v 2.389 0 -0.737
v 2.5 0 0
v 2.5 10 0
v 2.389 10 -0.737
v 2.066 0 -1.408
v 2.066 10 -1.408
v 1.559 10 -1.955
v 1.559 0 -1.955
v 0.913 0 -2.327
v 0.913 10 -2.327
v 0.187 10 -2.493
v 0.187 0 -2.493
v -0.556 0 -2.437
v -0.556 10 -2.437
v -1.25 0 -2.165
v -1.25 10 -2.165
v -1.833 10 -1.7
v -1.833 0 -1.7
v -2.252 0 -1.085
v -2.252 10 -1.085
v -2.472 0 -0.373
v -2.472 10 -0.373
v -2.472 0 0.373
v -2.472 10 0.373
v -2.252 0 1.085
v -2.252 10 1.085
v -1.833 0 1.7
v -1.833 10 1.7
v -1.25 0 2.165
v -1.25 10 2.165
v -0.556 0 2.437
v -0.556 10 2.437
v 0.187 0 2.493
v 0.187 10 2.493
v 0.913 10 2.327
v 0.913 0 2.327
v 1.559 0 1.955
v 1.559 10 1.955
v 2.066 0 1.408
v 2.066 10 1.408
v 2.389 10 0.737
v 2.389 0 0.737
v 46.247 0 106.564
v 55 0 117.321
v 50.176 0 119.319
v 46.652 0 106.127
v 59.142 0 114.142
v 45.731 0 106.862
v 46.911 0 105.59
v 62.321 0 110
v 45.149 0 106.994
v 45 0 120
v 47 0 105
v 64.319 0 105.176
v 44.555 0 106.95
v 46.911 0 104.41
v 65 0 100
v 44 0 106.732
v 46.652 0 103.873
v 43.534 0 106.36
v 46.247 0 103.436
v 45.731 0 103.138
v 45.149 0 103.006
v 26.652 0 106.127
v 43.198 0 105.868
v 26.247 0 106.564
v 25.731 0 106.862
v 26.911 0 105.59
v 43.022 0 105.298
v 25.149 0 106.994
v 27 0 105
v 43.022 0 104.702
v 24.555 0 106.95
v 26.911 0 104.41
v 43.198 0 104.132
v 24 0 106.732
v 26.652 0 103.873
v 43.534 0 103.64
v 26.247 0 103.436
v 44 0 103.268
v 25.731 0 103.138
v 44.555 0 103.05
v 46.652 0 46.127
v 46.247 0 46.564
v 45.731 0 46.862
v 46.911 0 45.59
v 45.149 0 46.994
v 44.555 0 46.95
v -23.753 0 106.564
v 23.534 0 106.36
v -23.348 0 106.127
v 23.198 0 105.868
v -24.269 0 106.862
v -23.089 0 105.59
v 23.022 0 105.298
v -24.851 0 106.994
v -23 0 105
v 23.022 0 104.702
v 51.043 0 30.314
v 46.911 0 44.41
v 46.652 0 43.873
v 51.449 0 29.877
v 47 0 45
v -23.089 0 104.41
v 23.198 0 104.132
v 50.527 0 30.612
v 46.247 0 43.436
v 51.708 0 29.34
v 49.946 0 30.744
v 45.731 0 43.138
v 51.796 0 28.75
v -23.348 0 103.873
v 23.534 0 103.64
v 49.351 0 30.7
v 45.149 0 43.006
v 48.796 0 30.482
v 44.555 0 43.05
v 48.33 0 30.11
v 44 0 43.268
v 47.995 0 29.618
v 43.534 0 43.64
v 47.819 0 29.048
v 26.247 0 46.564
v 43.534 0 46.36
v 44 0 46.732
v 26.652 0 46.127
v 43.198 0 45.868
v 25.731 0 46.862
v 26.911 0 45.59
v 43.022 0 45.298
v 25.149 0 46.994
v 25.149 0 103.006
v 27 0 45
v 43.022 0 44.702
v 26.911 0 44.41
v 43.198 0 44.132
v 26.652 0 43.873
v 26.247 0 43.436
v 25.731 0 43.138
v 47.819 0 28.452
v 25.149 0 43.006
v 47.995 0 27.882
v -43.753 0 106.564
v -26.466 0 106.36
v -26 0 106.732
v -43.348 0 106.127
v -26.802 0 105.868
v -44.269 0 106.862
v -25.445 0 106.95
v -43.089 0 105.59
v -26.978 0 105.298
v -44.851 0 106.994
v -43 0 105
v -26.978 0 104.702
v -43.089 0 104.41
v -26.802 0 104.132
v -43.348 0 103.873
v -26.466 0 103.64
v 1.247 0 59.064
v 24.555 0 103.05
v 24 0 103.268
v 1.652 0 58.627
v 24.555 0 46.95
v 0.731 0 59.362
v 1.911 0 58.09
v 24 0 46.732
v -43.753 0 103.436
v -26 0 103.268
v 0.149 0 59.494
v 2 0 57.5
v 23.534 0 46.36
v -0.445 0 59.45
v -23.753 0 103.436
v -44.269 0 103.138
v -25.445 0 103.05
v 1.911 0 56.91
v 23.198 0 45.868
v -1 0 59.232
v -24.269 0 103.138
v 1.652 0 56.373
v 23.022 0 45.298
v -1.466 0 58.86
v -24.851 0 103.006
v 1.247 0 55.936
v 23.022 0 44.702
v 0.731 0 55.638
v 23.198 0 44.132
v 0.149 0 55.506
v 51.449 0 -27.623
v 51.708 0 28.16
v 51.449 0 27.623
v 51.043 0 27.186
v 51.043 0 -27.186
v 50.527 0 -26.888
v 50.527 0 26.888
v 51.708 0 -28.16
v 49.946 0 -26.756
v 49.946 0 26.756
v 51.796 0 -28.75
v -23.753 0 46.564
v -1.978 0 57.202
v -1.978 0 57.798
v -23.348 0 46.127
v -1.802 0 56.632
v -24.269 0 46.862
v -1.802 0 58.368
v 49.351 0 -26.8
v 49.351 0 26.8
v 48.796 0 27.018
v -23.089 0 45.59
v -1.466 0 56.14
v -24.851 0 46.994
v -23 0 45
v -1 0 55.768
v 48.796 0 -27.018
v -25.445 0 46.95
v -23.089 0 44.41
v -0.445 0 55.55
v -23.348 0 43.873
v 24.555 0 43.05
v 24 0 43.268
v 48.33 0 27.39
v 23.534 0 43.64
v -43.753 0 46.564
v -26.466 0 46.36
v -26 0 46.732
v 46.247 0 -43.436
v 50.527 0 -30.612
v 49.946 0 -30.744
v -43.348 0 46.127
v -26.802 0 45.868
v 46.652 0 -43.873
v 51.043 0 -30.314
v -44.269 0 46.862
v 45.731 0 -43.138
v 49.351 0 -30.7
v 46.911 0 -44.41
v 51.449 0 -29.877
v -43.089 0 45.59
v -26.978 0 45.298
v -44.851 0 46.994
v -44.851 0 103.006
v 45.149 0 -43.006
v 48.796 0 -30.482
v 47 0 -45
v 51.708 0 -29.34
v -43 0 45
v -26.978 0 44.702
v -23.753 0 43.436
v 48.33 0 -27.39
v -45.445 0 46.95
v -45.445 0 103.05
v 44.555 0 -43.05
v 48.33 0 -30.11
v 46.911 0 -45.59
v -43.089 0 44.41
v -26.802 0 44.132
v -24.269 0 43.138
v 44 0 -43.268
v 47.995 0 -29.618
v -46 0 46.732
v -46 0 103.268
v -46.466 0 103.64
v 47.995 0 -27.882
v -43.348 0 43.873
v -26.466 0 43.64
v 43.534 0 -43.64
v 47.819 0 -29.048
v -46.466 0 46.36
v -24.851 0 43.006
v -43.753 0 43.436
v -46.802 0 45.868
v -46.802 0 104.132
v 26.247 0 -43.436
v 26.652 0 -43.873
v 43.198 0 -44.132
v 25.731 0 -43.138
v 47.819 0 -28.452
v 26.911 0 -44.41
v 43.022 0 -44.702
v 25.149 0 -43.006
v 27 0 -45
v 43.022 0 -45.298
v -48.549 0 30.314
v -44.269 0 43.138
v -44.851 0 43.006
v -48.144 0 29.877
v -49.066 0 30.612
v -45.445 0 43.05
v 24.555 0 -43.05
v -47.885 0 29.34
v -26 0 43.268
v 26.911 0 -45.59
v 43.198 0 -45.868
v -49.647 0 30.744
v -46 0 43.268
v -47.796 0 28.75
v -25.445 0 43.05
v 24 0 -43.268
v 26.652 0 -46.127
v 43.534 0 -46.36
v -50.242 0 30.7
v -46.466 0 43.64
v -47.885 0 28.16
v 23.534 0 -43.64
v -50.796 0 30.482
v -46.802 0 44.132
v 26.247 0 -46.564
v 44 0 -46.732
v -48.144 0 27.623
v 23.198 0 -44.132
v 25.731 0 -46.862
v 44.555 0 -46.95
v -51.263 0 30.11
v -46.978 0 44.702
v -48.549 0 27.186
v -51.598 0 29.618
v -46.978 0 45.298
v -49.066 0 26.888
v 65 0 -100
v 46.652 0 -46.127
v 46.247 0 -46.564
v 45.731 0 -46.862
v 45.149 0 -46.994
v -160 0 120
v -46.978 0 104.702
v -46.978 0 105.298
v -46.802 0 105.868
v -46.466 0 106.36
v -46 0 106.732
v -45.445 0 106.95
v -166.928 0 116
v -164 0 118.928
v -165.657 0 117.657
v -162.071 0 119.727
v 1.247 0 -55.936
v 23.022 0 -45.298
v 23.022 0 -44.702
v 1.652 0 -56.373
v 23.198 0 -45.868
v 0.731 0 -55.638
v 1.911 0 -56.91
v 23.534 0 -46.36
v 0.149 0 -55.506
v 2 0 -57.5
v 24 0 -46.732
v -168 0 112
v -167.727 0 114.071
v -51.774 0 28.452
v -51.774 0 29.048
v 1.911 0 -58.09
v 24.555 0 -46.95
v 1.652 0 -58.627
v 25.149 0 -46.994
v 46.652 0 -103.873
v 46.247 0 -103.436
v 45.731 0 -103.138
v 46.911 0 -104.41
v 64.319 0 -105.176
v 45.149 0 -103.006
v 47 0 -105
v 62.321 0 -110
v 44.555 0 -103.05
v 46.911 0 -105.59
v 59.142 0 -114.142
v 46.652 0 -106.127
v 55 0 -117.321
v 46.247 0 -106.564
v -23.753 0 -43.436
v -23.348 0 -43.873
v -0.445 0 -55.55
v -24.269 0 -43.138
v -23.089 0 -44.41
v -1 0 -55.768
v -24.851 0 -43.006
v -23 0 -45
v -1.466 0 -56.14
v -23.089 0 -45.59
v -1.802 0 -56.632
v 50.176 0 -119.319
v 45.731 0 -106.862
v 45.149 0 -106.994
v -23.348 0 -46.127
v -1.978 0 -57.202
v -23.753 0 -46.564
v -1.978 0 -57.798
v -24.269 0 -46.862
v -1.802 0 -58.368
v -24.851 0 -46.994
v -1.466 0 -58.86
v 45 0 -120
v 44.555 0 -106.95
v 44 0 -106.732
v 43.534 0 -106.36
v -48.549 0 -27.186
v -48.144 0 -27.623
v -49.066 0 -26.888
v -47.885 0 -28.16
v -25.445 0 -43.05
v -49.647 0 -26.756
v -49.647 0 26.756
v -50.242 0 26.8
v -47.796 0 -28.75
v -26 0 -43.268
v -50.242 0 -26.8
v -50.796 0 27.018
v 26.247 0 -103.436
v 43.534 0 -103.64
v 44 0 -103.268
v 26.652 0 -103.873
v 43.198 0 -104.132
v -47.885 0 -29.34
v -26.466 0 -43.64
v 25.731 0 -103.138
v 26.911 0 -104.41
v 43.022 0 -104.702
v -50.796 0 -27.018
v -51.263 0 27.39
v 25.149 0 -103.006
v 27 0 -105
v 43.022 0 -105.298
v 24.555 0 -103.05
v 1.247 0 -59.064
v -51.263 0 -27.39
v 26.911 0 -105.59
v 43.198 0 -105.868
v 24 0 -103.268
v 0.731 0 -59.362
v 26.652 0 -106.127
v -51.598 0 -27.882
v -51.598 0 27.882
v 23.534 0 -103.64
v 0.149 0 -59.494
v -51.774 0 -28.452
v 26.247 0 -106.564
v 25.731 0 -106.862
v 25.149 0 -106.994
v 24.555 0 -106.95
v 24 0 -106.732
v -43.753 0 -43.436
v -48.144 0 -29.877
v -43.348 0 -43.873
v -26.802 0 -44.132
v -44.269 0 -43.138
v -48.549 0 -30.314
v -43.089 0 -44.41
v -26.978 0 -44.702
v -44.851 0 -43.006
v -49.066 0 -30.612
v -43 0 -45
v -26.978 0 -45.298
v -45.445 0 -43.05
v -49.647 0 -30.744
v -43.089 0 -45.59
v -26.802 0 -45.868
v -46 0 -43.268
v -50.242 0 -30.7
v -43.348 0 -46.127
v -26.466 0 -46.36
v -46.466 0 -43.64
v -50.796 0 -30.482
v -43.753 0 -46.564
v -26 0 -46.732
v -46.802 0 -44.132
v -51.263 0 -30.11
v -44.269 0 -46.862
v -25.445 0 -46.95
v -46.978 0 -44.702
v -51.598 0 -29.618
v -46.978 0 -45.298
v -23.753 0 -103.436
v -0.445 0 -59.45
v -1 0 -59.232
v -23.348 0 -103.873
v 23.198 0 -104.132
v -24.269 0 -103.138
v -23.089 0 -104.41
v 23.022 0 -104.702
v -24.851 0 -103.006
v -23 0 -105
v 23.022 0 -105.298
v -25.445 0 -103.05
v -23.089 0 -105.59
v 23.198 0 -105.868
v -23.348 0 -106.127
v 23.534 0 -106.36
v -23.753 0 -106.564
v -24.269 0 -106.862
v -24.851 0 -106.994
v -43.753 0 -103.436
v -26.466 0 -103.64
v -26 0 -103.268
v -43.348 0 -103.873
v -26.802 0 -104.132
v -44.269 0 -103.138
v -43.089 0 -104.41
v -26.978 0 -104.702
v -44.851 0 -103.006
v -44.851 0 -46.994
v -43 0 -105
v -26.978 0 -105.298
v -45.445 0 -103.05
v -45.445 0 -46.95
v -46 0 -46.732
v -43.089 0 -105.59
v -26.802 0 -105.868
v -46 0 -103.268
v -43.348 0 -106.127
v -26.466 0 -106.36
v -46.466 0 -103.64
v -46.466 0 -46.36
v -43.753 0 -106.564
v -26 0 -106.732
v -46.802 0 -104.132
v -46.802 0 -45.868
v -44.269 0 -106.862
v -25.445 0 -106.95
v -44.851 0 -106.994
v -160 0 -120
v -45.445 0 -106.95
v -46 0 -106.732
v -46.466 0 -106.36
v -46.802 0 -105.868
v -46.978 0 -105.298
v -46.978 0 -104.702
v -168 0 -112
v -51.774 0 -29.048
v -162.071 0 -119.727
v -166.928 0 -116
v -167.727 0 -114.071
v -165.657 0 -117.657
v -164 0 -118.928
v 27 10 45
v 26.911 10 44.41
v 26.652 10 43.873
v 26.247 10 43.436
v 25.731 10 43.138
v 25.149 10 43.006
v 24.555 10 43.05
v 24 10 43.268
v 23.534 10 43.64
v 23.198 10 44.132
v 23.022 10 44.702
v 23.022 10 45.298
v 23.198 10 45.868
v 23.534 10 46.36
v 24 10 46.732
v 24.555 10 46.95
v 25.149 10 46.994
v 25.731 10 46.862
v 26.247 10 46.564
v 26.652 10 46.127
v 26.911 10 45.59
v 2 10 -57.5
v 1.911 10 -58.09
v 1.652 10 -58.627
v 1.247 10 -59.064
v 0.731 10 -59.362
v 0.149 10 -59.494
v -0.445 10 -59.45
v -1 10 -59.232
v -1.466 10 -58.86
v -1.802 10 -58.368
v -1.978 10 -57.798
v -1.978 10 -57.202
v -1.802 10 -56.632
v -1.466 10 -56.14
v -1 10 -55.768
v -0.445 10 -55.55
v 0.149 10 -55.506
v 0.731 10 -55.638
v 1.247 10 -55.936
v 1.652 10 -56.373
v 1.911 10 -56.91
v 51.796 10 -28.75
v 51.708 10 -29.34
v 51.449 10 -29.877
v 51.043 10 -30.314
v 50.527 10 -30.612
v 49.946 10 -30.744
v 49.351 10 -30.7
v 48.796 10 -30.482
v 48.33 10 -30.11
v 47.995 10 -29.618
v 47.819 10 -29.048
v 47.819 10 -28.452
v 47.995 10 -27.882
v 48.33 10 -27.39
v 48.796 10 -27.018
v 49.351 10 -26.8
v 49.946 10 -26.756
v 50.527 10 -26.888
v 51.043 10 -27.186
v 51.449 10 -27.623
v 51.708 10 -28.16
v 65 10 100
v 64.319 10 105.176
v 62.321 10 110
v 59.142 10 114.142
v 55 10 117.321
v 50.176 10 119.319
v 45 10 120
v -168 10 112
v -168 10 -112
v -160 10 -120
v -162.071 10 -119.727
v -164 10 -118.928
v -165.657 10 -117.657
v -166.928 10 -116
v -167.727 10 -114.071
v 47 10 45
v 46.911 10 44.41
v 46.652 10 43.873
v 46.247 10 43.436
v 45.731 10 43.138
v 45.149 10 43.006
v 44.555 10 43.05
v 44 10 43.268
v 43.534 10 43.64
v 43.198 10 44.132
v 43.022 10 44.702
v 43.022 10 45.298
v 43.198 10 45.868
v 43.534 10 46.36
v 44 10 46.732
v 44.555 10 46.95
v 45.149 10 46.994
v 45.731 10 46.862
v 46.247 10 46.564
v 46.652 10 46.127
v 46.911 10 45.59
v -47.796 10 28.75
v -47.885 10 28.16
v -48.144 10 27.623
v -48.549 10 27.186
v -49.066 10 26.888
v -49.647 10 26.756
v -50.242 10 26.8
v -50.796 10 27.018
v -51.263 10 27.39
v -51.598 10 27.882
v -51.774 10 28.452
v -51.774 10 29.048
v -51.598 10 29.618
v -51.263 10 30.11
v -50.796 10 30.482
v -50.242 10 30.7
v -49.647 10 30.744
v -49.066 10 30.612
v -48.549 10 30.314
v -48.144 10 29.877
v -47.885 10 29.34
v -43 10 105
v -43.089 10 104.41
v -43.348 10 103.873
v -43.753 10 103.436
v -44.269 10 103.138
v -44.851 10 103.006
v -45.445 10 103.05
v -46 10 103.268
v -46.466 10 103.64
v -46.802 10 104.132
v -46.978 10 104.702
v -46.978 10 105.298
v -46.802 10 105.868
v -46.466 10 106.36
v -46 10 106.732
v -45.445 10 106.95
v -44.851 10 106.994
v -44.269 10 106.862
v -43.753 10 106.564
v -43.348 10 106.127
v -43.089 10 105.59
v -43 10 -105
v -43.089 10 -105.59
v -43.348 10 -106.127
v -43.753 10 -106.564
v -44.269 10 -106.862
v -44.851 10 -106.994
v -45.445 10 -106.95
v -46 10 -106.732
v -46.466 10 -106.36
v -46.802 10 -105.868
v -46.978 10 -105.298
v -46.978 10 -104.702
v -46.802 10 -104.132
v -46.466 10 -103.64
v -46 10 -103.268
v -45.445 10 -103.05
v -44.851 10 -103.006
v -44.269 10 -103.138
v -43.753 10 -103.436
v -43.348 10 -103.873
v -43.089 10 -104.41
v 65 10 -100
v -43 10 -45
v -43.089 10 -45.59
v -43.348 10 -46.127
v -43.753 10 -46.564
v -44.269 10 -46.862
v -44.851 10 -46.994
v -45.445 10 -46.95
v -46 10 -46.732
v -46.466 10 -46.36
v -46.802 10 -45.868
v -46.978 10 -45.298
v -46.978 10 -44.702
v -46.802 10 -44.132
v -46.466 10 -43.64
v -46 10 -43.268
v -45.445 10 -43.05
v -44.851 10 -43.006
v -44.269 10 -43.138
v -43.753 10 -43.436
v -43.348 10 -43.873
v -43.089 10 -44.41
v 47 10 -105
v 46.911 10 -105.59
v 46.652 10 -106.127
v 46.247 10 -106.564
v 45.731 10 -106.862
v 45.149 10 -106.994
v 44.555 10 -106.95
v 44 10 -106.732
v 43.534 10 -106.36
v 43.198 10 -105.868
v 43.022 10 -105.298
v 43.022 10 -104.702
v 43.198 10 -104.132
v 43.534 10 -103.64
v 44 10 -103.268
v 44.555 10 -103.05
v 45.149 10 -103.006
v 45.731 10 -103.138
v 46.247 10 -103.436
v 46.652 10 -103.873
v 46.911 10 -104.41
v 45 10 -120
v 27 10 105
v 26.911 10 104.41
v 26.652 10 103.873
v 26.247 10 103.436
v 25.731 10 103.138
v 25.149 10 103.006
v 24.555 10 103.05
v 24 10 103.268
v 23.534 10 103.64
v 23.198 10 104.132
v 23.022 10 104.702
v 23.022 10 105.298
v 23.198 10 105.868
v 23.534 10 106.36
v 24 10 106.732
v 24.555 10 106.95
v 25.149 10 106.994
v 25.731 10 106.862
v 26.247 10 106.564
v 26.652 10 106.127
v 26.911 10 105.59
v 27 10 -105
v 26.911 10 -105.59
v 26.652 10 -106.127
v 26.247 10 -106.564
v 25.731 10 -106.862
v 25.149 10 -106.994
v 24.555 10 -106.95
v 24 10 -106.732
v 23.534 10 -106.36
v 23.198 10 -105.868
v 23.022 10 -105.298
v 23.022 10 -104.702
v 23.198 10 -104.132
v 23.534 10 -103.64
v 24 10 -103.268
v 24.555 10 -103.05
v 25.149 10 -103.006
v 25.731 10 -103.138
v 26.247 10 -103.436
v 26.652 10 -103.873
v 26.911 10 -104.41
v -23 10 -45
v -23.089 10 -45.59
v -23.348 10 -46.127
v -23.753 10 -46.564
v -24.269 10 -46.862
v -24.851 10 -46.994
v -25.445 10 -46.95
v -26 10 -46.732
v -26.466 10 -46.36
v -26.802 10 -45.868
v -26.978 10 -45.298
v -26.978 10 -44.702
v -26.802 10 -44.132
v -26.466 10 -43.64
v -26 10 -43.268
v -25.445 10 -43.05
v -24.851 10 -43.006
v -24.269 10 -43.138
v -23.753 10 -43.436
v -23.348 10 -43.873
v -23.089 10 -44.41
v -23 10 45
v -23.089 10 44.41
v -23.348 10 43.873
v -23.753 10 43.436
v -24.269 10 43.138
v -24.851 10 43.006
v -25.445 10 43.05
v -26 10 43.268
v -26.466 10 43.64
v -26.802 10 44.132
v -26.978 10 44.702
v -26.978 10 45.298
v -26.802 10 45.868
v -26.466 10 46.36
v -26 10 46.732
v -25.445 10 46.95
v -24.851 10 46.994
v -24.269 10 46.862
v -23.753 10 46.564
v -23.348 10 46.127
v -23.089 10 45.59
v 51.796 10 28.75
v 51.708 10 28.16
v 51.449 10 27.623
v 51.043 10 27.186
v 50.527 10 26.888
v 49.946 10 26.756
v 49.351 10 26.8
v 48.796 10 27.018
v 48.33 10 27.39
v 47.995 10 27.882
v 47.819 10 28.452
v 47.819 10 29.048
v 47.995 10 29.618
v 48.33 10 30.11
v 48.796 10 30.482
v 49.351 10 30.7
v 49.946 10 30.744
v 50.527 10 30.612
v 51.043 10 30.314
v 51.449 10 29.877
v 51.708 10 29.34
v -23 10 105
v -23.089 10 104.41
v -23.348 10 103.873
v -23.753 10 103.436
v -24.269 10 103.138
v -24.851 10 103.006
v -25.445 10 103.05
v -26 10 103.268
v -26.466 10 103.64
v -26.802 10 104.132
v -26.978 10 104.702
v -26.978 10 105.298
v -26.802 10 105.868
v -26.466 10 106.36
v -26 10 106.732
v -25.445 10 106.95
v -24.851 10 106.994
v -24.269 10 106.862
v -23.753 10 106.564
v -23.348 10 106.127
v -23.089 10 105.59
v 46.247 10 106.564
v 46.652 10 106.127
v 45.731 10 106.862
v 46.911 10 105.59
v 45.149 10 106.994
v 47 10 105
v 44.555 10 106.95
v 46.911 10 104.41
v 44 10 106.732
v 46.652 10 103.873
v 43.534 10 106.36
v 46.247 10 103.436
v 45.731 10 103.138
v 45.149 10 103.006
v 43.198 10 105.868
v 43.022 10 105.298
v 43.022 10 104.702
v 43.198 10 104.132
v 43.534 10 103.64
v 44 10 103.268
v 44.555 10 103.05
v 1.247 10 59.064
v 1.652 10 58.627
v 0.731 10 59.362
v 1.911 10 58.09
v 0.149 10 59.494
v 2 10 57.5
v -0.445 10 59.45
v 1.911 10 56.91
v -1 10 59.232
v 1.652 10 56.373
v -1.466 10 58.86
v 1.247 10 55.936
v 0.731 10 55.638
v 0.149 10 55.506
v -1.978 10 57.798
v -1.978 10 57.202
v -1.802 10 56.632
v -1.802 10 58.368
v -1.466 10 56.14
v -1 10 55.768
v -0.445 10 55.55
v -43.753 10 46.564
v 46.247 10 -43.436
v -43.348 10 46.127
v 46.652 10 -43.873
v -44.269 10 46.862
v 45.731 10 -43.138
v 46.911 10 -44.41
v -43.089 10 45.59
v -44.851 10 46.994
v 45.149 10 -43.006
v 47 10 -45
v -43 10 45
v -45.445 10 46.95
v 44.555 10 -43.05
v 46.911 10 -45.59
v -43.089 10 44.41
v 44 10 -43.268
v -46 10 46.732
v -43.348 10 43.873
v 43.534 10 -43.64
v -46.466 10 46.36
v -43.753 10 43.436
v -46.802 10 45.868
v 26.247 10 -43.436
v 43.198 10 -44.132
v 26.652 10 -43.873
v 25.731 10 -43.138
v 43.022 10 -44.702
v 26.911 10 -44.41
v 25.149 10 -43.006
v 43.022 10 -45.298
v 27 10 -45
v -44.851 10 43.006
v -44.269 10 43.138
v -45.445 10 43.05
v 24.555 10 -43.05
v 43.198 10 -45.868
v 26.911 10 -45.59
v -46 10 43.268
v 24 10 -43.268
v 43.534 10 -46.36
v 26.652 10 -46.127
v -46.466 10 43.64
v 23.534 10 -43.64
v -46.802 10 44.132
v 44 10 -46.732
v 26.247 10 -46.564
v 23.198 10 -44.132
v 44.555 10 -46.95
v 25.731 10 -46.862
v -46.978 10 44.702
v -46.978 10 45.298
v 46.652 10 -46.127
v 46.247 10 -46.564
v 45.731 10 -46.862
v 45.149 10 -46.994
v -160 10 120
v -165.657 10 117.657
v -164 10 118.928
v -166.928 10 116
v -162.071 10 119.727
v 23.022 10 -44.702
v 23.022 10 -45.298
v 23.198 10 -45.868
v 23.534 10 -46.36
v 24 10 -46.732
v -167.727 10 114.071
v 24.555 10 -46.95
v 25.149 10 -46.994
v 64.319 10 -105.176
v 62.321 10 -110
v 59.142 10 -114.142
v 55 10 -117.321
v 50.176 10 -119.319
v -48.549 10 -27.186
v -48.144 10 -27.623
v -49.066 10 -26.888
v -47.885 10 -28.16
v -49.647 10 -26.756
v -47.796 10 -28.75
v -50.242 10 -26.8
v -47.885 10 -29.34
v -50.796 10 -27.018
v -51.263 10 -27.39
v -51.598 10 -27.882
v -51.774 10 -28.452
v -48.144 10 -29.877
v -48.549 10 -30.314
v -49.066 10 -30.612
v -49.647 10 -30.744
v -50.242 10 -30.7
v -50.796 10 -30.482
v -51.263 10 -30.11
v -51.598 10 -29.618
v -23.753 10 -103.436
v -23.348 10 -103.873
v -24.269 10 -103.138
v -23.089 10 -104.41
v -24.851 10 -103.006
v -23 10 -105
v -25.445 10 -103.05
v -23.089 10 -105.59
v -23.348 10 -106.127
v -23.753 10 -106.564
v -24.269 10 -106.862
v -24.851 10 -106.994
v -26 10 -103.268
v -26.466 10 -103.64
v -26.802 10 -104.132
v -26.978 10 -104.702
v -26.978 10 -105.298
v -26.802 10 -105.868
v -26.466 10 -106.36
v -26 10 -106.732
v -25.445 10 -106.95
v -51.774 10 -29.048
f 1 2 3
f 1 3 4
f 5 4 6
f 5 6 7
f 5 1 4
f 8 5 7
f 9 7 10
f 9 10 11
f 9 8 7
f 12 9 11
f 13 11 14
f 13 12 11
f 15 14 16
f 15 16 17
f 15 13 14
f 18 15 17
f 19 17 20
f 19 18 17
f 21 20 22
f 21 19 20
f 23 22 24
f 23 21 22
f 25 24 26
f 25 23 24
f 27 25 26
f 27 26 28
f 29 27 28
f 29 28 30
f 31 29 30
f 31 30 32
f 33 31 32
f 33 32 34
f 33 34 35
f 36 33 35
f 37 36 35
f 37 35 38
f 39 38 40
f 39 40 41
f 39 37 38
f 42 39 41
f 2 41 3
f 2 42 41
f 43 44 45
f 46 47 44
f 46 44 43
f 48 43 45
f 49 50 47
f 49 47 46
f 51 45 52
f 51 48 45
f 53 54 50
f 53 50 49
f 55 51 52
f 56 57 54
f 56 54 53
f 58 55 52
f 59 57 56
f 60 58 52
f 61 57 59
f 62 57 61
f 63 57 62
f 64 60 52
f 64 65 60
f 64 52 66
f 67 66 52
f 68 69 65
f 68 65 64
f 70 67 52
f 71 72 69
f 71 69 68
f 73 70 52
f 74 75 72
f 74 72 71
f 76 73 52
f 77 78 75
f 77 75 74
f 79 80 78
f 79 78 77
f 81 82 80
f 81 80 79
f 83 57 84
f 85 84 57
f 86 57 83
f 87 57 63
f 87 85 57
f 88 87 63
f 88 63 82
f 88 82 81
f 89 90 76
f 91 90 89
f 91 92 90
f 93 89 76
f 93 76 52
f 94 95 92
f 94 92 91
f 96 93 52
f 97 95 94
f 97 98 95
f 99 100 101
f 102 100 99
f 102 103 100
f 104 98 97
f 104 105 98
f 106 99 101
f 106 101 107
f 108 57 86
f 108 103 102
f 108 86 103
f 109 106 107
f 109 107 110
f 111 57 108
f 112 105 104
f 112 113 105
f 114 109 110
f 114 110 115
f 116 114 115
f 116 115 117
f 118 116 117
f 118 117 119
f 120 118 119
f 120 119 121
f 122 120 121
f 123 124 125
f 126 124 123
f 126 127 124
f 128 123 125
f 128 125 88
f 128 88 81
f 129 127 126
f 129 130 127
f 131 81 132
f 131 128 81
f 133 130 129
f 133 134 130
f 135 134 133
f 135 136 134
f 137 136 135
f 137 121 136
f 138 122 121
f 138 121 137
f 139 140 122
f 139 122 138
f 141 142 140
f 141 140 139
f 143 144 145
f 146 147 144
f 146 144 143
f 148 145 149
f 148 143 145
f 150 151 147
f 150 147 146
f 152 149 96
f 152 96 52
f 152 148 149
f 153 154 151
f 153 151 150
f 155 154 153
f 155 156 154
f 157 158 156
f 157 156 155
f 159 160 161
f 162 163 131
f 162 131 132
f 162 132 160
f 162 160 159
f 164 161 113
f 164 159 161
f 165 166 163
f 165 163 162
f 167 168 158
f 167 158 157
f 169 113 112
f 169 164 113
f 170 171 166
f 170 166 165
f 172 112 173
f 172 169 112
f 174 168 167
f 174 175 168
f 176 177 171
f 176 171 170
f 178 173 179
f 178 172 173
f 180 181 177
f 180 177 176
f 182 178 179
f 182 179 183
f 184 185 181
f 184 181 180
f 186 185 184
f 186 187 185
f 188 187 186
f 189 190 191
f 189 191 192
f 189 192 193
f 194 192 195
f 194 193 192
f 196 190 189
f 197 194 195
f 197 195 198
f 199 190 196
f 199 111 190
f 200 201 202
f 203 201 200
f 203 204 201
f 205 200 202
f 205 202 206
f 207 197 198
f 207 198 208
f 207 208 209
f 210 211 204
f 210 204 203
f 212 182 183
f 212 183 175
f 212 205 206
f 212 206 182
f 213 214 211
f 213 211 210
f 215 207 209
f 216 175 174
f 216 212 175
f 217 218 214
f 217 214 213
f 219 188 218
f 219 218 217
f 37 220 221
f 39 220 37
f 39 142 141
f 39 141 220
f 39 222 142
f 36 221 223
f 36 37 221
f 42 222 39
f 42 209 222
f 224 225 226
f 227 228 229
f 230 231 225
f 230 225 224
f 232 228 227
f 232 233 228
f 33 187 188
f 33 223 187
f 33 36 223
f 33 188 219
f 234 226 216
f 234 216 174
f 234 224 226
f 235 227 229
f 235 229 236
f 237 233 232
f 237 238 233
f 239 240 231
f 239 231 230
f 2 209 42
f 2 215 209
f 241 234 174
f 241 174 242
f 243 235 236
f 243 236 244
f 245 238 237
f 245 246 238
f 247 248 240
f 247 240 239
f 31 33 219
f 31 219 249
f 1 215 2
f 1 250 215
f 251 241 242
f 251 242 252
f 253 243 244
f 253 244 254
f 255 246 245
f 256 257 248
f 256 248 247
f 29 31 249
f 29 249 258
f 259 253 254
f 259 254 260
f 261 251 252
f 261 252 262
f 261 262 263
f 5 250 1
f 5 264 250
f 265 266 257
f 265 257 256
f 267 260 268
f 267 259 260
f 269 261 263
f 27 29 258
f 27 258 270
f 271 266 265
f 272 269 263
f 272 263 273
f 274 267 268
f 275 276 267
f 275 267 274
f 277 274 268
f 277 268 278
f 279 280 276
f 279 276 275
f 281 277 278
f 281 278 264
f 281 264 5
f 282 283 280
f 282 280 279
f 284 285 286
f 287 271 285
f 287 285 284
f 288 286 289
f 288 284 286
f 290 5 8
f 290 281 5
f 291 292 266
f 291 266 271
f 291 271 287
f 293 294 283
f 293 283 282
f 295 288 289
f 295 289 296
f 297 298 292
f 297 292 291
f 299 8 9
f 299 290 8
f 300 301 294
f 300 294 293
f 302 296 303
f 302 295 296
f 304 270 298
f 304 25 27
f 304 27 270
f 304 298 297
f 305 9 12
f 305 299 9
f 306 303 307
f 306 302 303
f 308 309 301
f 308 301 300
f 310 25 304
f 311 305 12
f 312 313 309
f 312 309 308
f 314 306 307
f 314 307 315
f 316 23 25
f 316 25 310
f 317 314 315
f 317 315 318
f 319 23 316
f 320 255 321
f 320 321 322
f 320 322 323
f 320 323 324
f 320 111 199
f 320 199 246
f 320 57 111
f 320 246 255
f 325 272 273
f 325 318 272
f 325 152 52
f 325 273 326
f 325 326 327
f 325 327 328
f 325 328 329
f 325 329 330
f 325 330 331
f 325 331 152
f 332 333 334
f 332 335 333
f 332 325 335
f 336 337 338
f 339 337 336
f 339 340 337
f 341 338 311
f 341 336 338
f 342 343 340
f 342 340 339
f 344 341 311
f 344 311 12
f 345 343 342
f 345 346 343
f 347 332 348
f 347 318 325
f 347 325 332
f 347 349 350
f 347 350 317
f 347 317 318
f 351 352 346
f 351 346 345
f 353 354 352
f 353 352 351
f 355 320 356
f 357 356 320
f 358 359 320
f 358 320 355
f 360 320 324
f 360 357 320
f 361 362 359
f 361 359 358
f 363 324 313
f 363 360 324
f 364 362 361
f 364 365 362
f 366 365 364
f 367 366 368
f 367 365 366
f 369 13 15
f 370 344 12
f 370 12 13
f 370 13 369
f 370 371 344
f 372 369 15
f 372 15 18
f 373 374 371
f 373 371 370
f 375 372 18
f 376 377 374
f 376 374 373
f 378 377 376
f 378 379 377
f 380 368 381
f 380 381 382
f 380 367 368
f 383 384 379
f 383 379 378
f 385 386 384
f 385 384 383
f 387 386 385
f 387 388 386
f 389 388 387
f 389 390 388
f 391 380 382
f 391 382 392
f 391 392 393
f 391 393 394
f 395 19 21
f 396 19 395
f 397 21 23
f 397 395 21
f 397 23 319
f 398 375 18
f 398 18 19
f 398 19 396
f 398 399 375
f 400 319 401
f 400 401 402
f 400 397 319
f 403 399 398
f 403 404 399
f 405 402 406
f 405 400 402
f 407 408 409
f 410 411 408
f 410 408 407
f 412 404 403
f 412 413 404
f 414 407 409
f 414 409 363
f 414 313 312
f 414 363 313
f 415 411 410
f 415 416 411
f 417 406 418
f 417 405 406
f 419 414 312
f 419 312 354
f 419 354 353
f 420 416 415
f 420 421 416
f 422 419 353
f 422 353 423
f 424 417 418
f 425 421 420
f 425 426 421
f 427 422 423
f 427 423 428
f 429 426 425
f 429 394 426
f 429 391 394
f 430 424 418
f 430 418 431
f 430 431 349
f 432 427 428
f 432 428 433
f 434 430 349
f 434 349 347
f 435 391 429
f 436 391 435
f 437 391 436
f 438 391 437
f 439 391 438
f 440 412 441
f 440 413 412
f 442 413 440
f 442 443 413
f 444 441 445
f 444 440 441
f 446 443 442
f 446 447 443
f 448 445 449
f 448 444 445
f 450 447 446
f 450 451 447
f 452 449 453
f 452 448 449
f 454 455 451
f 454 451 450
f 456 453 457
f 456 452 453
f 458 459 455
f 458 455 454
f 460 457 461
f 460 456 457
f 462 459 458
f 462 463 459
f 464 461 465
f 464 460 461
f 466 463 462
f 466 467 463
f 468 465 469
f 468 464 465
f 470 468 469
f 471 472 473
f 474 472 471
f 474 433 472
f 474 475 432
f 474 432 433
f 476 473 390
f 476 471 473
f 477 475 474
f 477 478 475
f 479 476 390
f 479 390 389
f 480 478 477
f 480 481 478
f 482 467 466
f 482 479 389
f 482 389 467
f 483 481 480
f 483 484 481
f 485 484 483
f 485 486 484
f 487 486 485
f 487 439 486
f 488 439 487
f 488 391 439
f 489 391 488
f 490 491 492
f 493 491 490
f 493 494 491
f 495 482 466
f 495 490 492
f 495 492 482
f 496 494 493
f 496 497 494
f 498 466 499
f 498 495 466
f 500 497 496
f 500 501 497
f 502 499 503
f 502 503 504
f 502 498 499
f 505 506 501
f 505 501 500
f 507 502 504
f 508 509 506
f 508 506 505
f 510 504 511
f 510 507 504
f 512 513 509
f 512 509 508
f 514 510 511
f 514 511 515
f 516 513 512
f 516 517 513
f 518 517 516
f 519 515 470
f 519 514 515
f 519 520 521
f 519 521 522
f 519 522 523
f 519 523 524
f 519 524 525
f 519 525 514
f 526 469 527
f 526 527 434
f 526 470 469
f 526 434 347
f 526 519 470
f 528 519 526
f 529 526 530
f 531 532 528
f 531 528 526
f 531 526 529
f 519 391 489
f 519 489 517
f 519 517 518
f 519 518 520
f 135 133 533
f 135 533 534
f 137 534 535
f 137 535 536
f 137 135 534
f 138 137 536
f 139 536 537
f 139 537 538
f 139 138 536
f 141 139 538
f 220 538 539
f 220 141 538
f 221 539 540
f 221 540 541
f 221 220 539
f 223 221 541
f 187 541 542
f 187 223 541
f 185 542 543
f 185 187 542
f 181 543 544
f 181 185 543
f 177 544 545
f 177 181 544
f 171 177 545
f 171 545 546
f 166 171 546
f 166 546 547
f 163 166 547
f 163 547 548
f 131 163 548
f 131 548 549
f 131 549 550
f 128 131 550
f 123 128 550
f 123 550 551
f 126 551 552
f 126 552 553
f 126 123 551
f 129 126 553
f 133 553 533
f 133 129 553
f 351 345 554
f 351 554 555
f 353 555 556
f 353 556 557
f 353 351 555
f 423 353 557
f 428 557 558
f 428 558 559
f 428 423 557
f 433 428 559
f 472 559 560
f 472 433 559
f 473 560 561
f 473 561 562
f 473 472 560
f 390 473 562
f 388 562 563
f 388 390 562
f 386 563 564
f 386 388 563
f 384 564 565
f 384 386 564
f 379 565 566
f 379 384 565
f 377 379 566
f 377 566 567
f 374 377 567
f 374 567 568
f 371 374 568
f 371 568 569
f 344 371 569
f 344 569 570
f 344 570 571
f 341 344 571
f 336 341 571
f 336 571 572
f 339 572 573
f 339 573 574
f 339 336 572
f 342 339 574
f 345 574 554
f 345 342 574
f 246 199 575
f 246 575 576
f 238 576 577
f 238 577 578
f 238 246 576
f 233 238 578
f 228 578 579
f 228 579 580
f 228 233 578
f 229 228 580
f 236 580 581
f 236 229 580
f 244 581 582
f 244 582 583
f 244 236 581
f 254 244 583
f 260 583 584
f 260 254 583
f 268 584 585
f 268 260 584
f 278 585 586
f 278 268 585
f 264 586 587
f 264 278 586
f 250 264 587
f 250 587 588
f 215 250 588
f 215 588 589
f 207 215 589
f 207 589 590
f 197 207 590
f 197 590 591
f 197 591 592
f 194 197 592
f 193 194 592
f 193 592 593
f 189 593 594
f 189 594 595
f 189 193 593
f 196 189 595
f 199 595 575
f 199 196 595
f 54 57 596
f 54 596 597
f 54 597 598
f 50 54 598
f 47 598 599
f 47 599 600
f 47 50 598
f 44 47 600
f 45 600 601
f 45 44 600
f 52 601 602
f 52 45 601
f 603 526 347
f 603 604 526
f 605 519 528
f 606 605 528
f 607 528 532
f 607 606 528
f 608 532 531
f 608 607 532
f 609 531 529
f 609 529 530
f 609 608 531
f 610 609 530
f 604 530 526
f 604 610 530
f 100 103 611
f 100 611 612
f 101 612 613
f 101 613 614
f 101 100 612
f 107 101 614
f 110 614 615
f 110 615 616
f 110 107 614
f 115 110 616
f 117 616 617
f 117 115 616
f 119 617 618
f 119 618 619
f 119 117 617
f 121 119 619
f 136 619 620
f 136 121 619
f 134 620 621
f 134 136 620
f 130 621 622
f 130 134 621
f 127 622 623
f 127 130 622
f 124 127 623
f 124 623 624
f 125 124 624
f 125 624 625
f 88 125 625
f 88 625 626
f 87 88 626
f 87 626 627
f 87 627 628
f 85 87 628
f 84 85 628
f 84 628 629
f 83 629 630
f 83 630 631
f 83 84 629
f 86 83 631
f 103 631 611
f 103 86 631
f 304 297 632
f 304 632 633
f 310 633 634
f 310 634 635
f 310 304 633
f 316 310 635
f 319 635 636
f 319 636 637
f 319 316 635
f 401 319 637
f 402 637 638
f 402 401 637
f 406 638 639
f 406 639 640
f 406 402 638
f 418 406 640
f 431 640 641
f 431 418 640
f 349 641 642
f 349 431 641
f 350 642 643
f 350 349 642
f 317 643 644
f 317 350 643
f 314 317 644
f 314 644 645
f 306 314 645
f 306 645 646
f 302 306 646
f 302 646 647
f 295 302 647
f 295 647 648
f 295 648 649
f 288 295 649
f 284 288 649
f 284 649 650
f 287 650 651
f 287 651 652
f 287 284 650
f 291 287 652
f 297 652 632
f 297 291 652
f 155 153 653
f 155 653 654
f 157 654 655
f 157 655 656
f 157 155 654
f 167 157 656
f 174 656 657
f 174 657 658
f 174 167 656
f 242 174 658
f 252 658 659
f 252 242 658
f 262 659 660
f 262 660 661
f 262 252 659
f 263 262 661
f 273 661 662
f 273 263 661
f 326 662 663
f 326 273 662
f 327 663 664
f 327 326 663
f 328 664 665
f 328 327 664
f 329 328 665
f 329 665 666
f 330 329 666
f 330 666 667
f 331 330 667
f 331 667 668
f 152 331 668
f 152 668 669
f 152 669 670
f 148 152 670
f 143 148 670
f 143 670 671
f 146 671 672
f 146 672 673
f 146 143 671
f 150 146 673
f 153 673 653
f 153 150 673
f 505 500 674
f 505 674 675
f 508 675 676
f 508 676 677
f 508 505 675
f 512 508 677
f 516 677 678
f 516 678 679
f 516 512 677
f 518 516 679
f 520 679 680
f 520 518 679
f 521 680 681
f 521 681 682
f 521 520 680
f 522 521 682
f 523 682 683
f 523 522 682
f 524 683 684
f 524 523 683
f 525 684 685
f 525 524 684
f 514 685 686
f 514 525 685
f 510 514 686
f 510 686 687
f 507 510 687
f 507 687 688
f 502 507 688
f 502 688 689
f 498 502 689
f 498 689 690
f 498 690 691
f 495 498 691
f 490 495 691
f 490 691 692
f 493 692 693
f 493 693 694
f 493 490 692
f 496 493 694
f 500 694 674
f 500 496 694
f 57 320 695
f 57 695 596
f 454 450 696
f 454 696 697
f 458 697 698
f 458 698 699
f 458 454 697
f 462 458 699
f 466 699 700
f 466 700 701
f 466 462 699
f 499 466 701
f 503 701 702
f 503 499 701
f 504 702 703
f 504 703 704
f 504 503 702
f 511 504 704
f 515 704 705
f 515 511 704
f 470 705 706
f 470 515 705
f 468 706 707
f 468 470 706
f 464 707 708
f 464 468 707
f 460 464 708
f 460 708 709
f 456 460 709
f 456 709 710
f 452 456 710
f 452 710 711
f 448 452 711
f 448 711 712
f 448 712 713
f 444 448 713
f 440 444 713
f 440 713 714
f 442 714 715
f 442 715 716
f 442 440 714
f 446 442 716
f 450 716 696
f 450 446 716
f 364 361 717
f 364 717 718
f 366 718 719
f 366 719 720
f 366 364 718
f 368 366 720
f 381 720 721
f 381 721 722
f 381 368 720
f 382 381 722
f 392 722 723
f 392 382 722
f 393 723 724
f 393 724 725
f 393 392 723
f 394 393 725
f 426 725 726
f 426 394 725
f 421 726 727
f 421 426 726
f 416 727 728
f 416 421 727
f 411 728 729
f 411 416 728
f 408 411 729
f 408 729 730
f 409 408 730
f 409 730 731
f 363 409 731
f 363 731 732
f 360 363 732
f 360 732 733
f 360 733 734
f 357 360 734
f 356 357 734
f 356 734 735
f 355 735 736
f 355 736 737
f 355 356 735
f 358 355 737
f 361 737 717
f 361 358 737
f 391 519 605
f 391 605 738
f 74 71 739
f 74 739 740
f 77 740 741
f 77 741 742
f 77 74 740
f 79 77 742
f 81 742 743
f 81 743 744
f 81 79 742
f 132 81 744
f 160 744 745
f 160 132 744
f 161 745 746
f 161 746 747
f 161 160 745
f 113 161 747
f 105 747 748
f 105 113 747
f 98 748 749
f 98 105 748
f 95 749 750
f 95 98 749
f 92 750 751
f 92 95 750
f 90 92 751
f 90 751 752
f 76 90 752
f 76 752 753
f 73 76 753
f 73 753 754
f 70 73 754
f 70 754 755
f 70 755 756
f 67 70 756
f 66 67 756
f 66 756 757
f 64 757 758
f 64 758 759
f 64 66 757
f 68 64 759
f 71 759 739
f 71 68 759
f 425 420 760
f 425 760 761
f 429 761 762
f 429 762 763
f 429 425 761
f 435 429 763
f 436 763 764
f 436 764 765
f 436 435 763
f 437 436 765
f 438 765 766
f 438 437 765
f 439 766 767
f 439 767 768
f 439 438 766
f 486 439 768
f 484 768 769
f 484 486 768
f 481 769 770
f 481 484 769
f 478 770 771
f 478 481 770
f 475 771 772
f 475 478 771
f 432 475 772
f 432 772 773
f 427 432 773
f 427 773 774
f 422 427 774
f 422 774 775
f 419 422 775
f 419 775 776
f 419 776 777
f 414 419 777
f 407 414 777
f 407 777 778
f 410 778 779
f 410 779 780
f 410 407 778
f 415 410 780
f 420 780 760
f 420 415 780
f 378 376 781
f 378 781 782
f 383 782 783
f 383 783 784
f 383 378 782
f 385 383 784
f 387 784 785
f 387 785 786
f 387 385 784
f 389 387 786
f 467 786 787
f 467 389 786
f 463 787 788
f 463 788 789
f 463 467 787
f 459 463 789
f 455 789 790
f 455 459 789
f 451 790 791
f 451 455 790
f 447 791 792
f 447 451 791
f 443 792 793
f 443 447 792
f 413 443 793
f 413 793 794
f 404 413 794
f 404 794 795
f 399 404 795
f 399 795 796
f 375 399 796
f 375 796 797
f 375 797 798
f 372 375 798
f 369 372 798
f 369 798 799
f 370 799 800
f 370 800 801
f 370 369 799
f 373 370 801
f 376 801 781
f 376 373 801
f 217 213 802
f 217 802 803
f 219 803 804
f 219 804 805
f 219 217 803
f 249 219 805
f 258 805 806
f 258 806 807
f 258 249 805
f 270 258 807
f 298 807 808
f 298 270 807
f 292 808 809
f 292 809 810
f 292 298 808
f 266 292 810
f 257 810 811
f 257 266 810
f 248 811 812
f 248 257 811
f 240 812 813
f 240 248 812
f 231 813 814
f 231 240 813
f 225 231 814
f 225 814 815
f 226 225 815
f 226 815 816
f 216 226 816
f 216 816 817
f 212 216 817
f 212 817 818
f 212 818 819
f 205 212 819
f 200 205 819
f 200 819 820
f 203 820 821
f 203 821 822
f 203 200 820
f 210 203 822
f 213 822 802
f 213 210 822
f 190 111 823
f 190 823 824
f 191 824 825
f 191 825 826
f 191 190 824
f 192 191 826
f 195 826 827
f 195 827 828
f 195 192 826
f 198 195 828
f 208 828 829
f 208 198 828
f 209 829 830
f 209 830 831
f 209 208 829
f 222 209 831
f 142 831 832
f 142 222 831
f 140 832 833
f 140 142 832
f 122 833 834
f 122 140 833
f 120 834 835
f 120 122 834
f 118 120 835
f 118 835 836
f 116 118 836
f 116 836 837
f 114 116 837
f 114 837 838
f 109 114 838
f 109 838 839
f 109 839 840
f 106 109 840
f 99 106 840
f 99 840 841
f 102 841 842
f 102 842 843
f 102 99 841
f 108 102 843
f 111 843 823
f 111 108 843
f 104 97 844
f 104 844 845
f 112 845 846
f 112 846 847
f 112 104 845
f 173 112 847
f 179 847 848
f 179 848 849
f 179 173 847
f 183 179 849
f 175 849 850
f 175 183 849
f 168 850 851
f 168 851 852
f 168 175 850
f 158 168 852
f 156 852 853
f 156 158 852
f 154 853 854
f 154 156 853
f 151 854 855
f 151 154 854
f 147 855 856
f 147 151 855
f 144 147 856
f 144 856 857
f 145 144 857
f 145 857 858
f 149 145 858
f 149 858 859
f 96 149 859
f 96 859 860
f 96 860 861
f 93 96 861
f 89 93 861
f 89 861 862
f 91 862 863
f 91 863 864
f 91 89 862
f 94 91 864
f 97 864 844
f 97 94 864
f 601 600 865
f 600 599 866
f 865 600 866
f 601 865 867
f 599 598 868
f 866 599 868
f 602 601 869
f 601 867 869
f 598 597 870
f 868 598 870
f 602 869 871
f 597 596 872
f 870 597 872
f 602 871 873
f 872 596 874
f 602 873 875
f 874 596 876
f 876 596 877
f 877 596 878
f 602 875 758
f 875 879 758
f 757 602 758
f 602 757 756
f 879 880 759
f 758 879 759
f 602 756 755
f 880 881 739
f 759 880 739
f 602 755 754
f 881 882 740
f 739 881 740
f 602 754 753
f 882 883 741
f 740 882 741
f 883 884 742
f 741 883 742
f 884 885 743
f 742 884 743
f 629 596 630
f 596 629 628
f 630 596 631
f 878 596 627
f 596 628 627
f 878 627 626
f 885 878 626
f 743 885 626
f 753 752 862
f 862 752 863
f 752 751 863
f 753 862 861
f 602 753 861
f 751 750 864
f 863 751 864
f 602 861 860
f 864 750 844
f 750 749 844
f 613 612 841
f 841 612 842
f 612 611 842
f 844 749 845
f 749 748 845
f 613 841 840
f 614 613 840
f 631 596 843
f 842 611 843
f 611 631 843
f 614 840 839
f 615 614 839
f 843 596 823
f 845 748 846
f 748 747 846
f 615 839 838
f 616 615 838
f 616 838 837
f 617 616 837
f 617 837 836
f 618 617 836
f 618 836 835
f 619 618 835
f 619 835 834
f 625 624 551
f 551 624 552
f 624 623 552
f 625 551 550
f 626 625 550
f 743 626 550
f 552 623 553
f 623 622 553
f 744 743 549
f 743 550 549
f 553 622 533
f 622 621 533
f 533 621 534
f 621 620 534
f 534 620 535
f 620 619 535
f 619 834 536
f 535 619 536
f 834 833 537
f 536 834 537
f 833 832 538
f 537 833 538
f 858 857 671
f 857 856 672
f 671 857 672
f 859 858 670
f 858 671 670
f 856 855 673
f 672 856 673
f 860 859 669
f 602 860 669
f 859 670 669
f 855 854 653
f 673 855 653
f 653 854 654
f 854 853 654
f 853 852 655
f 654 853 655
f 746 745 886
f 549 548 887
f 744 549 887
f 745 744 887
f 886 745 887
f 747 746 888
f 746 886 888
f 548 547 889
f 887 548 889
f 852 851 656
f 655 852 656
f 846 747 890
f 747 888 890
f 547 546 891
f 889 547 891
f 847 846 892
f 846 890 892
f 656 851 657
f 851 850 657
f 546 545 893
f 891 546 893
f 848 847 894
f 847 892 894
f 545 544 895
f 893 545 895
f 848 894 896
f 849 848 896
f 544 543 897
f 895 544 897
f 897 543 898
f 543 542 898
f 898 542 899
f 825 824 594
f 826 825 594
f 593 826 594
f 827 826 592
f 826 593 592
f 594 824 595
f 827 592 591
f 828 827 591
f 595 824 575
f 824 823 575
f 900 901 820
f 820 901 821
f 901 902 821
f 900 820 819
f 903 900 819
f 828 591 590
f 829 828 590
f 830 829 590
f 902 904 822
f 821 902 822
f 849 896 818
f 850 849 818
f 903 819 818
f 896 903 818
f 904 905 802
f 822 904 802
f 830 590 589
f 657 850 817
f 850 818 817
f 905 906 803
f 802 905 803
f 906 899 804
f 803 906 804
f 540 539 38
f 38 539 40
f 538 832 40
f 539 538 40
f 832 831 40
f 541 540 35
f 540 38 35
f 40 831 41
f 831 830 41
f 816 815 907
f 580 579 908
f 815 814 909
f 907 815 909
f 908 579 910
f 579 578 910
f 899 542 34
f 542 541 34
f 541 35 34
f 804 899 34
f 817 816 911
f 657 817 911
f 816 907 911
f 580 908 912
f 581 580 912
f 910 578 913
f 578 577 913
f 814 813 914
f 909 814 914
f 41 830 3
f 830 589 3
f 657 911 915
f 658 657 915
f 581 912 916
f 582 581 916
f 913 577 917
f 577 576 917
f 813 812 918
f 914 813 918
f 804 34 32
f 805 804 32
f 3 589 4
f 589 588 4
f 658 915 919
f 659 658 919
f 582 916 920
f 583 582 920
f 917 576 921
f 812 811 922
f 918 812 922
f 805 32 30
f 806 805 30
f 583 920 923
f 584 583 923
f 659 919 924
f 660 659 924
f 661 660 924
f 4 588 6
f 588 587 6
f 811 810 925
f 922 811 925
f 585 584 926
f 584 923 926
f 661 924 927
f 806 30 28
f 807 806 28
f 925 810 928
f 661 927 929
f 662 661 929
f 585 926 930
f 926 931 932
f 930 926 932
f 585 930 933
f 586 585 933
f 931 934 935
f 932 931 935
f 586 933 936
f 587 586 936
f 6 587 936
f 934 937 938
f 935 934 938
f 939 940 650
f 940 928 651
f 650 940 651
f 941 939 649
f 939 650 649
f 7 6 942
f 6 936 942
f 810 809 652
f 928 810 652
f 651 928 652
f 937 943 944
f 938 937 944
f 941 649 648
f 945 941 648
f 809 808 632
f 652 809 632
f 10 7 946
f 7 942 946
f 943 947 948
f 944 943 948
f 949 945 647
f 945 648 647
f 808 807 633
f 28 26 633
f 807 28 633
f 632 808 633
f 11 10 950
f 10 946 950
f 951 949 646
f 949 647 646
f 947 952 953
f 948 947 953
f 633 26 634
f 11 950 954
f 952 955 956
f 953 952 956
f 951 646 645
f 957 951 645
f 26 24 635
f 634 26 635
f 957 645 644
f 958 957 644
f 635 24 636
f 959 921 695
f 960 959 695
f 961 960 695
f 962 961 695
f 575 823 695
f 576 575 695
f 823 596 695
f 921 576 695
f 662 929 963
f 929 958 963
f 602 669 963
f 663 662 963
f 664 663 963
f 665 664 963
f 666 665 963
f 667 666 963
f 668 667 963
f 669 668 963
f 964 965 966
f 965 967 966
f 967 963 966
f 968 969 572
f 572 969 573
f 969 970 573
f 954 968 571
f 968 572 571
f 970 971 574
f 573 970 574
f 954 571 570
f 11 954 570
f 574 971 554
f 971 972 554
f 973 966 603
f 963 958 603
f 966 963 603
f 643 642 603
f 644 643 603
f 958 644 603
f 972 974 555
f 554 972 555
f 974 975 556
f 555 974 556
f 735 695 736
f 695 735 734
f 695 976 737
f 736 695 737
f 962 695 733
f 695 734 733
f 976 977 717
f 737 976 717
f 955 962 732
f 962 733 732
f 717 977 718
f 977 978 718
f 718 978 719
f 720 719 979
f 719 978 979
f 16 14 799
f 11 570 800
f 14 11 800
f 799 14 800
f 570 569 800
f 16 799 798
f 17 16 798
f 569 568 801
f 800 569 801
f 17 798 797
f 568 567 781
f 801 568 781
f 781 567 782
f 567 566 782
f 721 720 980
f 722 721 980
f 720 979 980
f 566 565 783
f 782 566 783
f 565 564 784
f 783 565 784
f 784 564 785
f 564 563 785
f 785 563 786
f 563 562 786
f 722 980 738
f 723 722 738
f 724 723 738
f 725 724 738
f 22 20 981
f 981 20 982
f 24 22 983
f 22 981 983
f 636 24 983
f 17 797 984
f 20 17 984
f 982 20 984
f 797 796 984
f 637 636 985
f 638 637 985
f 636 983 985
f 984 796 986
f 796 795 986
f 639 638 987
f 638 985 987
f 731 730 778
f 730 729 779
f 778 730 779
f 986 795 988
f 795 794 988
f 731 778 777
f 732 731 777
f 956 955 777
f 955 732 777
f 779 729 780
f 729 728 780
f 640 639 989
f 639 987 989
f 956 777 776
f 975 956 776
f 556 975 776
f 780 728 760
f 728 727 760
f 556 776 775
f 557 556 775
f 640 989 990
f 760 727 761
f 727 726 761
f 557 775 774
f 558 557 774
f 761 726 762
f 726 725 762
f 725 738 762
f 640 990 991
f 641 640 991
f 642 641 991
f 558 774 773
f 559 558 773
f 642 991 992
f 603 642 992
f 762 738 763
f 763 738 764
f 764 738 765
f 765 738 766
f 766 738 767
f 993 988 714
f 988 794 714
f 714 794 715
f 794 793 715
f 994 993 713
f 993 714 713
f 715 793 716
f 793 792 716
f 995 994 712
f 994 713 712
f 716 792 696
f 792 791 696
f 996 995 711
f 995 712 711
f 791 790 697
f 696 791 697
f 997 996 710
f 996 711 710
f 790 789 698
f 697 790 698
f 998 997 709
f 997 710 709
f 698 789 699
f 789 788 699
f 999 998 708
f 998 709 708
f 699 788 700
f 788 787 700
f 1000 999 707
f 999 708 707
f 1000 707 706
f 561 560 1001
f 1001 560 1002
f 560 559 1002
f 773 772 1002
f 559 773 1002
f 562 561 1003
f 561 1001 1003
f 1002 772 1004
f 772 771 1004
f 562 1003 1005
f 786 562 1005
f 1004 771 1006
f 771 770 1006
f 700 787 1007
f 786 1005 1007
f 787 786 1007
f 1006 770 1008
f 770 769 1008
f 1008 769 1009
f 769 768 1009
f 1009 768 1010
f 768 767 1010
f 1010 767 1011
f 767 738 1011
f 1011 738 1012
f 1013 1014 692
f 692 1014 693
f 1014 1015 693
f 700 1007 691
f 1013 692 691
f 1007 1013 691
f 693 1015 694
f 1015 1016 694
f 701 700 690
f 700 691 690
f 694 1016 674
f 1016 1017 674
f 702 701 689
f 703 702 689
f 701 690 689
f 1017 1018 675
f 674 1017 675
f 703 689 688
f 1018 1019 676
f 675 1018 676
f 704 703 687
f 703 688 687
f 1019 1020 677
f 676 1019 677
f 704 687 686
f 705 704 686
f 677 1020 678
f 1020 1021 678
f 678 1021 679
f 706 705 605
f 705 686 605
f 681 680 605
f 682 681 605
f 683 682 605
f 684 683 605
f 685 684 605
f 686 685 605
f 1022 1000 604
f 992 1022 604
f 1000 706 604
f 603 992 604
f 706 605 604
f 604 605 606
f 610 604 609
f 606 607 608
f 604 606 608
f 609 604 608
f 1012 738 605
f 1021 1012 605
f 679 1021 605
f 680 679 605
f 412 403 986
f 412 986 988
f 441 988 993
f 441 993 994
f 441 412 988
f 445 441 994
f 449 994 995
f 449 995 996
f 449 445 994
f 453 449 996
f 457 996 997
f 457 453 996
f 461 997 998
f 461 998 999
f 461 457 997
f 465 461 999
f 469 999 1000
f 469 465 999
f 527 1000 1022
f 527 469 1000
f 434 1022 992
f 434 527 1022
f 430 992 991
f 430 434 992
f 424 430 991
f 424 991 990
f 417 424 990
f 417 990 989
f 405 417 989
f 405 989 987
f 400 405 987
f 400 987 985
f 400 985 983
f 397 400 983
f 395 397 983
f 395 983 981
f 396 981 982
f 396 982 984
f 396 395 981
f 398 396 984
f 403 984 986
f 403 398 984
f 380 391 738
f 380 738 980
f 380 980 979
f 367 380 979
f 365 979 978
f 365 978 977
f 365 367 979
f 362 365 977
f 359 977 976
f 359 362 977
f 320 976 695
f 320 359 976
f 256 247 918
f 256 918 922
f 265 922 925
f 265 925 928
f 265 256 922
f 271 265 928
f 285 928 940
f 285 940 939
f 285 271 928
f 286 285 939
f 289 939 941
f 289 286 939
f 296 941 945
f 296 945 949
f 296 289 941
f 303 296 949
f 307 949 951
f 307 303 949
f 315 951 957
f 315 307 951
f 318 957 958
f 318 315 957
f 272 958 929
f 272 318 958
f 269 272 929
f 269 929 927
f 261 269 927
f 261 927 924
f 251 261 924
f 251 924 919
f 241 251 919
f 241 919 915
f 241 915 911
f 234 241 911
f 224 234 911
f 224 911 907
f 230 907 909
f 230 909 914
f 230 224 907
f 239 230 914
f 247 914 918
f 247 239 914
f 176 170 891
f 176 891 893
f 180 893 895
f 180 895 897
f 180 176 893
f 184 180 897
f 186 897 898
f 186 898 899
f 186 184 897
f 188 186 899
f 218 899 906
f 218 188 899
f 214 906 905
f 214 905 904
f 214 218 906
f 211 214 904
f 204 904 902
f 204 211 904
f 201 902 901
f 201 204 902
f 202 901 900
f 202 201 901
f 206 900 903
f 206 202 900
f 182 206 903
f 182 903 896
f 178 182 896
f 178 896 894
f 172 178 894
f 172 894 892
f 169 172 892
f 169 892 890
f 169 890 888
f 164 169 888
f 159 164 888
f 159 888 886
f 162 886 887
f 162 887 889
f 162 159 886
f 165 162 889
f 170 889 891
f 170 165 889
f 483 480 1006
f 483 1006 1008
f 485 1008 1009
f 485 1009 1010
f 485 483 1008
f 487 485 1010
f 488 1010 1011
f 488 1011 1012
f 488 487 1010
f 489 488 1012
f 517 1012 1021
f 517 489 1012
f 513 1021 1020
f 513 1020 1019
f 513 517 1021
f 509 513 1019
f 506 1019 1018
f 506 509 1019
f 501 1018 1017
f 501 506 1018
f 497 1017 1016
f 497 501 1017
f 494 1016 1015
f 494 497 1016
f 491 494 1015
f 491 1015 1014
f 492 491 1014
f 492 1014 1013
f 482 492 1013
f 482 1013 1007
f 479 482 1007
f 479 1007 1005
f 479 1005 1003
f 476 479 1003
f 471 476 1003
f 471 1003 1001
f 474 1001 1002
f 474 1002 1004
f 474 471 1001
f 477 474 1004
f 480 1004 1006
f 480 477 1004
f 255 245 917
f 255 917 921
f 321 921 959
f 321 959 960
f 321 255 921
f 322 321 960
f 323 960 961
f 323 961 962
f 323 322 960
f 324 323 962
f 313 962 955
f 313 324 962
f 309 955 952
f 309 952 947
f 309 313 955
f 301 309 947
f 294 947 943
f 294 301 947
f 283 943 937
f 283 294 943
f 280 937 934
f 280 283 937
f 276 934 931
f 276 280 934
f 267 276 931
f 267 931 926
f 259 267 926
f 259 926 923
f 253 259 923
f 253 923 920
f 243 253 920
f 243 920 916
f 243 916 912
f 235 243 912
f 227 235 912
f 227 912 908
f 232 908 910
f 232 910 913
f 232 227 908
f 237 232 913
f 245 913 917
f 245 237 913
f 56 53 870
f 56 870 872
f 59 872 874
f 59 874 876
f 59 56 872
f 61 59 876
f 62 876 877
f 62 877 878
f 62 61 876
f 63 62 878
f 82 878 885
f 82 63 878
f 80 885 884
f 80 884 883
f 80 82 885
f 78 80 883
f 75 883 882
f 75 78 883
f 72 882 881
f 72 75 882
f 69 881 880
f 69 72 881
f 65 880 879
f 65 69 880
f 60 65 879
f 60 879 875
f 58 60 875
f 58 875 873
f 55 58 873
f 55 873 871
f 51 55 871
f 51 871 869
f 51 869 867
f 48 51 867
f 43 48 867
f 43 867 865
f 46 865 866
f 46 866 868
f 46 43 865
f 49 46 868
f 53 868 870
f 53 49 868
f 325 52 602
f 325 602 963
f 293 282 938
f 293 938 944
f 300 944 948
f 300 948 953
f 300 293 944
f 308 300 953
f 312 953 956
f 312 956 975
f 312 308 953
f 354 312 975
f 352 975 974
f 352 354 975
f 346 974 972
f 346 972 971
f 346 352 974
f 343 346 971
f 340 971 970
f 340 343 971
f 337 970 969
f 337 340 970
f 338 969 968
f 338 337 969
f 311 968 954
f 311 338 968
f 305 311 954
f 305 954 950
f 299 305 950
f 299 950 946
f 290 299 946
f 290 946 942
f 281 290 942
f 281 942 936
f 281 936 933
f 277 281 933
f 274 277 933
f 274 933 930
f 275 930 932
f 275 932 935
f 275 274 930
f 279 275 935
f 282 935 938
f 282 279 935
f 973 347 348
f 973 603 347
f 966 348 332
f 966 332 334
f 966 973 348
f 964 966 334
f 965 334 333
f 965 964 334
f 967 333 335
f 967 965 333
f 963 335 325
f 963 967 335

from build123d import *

# Parameters (mm, degrees)
SKETCH1_R           = 2
SKETCH1_R_2         = 2.5
BOSS_EXTRUDE1_DEPTH = 10
SKETCH3_W           = 240
SKETCH3_H           = 10
CUT_EXTRUDE1_DEPTH  = 45
FILLET1_R           = 8


with BuildPart() as part:
    # Sketch1 → Boss-Extrude1 (new body)
    with BuildSketch(Plane(origin=(0, 0, 0), x_dir=(1, 0, 0), z_dir=(0, 1, 0))):
        with BuildLine():
            Line((-193, 120), (45, 120))
            ThreePointArc((45, 120), (59.142135624, 114.142135624), (65, 100))
            Line((65, 100), (65, -100))
            ThreePointArc((65, -100), (59.142135624, -114.142135624), (45, -120))
            Line((45, -120), (-193, -120))
            ThreePointArc((-193, -120), (-207.142135624, -114.142135624), (-213, -100))
            Line((-213, -100), (-213, 100))
            ThreePointArc((-213, 100), (-207.142135624, 114.142135624), (-193, 120))
        make_face()
        with Locations((0, -57.5)):
            Circle(SKETCH1_R, mode=Mode.SUBTRACT)
        with Locations((-49.796460718, -28.75)):
            Circle(SKETCH1_R, mode=Mode.SUBTRACT)
        with Locations((-49.796460718, 28.75)):
            Circle(SKETCH1_R, mode=Mode.SUBTRACT)
        with Locations((0, 57.5)):
            Circle(SKETCH1_R, mode=Mode.SUBTRACT)
        with Locations((49.796460718, 28.75)):
            Circle(SKETCH1_R, mode=Mode.SUBTRACT)
        with Locations((49.796460718, -28.75)):
            Circle(SKETCH1_R, mode=Mode.SUBTRACT)
        Circle(SKETCH1_R_2, mode=Mode.SUBTRACT)
        with Locations((-45, 105)):
            Circle(SKETCH1_R, mode=Mode.SUBTRACT)
        with Locations((-25, 105)):
            Circle(SKETCH1_R, mode=Mode.SUBTRACT)
        with Locations((25, 105)):
            Circle(SKETCH1_R, mode=Mode.SUBTRACT)
        with Locations((45, 105)):
            Circle(SKETCH1_R, mode=Mode.SUBTRACT)
        with Locations((-45, 45)):
            Circle(SKETCH1_R, mode=Mode.SUBTRACT)
        with Locations((-25, 45)):
            Circle(SKETCH1_R, mode=Mode.SUBTRACT)
        with Locations((25, 45)):
            Circle(SKETCH1_R, mode=Mode.SUBTRACT)
        with Locations((45, 45)):
            Circle(SKETCH1_R, mode=Mode.SUBTRACT)
        with Locations((-45, -45)):
            Circle(SKETCH1_R, mode=Mode.SUBTRACT)
        with Locations((-25, -45)):
            Circle(SKETCH1_R, mode=Mode.SUBTRACT)
        with Locations((25, -45)):
            Circle(SKETCH1_R, mode=Mode.SUBTRACT)
        with Locations((45, -45)):
            Circle(SKETCH1_R, mode=Mode.SUBTRACT)
        with Locations((45, -105)):
            Circle(SKETCH1_R, mode=Mode.SUBTRACT)
        with Locations((25, -105)):
            Circle(SKETCH1_R, mode=Mode.SUBTRACT)
        with Locations((-25, -105)):
            Circle(SKETCH1_R, mode=Mode.SUBTRACT)
        with Locations((-45, -105)):
            Circle(SKETCH1_R, mode=Mode.SUBTRACT)
    extrude(amount=BOSS_EXTRUDE1_DEPTH)

    # Sketch3 → Cut-Extrude1 (cut)
    with BuildSketch(Plane.ZY.offset(213)):
        with Locations((0, 5)):
            Rectangle(SKETCH3_W, SKETCH3_H)
    extrude(amount=-CUT_EXTRUDE1_DEPTH, mode=Mode.SUBTRACT)

    # Fillet1
    fillet1_edges = [part.edges().sort_by_distance(p)[0] for p in [
        (-168, 5, 120),
        (-168, 5, -120),
    ]]
    fillet(fillet1_edges, radius=FILLET1_R)


solid = part.part
